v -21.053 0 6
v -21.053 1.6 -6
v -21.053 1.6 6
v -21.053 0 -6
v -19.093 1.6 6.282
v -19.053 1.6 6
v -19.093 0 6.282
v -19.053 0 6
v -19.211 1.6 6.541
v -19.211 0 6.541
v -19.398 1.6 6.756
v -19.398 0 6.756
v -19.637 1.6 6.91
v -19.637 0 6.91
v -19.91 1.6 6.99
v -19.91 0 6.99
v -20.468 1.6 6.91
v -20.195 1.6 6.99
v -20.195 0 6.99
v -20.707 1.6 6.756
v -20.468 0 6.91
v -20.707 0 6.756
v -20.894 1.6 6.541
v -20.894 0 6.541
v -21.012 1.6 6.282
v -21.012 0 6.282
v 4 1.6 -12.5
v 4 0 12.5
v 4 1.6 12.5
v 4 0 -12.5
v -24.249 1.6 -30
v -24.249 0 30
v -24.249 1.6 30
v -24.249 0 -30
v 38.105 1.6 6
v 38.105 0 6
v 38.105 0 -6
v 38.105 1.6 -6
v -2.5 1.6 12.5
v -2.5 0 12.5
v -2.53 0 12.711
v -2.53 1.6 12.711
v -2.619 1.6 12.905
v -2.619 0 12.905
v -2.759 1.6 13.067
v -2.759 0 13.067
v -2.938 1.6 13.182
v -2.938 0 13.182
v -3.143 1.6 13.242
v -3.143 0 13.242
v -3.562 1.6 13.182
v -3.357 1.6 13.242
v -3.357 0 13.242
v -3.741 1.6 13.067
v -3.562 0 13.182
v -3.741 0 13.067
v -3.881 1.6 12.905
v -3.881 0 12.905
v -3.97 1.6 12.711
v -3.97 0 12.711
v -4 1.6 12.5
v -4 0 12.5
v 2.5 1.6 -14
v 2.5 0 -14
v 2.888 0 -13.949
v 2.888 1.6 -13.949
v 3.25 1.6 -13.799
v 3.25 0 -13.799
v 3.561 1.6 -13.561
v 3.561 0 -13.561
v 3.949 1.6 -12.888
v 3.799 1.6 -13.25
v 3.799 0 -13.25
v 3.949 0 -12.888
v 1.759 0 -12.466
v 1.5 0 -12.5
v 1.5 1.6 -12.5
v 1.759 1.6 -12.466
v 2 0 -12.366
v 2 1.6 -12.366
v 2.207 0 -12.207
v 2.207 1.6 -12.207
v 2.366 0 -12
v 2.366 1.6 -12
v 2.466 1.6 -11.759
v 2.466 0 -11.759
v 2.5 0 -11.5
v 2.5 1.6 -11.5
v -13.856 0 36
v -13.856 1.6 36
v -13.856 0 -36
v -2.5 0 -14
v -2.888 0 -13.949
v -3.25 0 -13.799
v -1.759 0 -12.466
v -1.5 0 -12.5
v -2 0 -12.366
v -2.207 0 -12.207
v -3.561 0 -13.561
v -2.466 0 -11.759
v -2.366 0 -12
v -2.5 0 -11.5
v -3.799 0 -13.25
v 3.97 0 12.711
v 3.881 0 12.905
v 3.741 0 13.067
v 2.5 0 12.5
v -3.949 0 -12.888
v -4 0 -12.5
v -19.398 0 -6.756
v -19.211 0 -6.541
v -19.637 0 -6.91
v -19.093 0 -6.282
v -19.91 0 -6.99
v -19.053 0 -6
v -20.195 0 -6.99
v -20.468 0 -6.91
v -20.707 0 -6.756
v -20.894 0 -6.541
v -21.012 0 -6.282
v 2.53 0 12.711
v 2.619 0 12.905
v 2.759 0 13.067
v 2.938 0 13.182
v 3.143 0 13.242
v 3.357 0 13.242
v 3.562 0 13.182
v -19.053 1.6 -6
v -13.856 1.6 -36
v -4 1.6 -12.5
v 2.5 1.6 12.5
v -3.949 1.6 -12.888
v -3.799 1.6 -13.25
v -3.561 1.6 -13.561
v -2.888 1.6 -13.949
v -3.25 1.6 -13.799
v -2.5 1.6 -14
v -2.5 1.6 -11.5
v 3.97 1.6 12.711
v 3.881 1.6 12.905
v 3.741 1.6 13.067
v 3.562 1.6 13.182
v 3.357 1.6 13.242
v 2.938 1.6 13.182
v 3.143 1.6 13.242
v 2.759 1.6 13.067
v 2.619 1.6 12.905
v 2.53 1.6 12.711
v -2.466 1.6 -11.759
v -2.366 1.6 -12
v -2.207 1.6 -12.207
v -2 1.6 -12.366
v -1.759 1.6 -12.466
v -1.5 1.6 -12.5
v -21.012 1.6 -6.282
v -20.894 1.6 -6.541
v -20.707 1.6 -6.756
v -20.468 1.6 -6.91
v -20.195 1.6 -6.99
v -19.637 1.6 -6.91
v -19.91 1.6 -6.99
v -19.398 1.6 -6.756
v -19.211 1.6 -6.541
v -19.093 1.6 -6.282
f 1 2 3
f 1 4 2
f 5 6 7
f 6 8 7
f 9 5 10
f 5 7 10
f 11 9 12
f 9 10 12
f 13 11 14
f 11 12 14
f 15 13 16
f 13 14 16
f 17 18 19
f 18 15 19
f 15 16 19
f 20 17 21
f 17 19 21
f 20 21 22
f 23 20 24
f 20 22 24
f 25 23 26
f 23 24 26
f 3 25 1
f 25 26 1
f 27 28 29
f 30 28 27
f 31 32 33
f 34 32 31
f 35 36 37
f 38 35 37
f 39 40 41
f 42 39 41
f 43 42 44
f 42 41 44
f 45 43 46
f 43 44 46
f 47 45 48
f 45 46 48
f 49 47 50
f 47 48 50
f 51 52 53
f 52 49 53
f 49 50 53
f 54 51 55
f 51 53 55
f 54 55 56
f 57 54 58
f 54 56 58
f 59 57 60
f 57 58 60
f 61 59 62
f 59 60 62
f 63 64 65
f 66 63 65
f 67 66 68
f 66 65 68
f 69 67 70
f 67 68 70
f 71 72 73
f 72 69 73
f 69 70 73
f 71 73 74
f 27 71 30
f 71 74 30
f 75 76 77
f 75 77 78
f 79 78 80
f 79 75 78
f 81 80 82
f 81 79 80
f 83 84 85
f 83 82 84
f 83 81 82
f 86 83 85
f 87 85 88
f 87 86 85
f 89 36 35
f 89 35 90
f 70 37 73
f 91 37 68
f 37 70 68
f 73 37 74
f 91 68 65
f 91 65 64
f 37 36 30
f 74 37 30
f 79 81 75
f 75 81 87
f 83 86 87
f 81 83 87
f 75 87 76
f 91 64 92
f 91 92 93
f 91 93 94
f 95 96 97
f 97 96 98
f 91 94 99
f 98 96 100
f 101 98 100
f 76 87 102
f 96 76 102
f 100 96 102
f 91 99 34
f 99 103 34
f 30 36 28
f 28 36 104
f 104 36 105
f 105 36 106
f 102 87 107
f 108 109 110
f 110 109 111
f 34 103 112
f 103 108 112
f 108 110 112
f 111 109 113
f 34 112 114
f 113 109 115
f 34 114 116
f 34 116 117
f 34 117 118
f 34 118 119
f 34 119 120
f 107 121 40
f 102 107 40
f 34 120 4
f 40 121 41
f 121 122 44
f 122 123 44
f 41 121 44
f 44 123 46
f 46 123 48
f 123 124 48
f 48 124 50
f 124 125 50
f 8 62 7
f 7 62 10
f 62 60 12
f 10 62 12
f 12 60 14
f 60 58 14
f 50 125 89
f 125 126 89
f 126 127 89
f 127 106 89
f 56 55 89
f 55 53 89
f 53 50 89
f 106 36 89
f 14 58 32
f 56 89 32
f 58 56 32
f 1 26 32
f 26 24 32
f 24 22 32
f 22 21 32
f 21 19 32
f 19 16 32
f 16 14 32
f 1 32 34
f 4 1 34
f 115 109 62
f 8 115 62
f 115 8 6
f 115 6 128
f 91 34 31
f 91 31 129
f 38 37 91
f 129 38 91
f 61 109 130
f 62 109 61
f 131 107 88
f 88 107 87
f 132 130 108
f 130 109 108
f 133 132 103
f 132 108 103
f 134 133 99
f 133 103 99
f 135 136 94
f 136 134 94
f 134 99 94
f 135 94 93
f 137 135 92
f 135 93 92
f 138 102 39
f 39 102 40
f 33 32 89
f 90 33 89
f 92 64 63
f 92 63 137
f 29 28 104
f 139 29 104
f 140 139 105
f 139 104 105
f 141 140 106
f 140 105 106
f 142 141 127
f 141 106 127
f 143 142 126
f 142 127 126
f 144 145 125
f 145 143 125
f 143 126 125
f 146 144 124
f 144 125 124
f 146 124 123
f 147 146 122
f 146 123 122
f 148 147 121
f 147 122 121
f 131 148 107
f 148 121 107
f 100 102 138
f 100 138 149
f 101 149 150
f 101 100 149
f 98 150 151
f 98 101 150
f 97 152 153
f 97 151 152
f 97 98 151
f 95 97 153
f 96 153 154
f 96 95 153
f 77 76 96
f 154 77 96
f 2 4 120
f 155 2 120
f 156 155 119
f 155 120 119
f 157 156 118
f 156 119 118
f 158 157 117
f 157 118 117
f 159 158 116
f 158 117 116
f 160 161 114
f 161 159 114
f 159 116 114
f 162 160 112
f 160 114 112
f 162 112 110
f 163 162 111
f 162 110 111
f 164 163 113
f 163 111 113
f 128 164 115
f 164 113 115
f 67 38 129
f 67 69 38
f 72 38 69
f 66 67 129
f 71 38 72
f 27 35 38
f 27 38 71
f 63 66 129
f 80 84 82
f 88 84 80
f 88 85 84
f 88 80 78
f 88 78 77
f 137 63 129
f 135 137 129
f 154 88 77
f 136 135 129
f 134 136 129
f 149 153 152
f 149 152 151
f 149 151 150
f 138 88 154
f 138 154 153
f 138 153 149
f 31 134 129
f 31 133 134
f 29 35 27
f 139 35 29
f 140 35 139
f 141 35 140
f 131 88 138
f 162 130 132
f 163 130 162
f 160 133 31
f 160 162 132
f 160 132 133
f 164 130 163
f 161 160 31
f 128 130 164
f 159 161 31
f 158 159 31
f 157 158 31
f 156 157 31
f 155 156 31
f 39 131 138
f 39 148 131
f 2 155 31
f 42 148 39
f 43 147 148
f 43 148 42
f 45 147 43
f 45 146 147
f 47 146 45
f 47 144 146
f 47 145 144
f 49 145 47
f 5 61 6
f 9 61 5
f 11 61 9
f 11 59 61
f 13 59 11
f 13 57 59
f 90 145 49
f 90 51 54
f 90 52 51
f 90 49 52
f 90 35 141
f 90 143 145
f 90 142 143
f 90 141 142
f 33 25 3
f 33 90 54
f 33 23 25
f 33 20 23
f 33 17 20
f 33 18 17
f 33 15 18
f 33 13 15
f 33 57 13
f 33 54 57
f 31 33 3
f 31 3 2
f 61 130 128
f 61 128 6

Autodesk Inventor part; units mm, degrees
ref_plane "YZ Plane" through (0, 0, 0) normal (1, 0, 0) x (0, 1, 0)
ref_plane "XZ Plane" through (0, 0, 0) normal (0, 1, 0) x (-1, 0, 0)
ref_plane "XY Plane" through (0, 0, 0) normal (0, 0, 1) x (1, 0, 0)
sketch "Sketch1" plane through (0, 0, 0) normal (0, 1, 0) x (-1, 0, 0)
  line L0 (-38.1051, 6) -> (13.8564, 36)
  line L1 (-38.1051, -6) -> (13.8564, -36)
  line L2 (24.2487, 30) -> (24.2487, -30)
  line L3 (24.2487, 30) -> (13.8564, 36)
  line L4 (24.2487, -30) -> (13.8564, -36)
  line L5 (-38.1051, 6) -> (-38.1051, -6)
  line L6 (19.0526, 6) -> (19.0526, -6)
  line L7 (21.0526, -6) -> (21.0526, 6)
  arc A0 (21.0526, 6) -> (19.0526, 6) centre (20.0526, 6) ccw
  arc A1 (19.0526, -6) -> (21.0526, -6) centre (20.0526, -6) ccw
  line L8 (-2.5, 12.5) -> (-2.5, -11.5)
  line L9 (-1.5, -12.5) -> (1.5, -12.5)
  line L10 (2.5, -11.5) -> (2.5, 12.5)
  line L11 (-4, 12.5) -> (-4, -12.5)
  line L12 (-2.5, -14) -> (2.5, -14)
  line L13 (4, -12.5) -> (4, 12.5)
  arc A2 (4, 12.5) -> (2.5, 12.5) centre (3.25, 12.5) ccw
  arc A3 (-2.5, 12.5) -> (-4, 12.5) centre (-3.25, 12.5) ccw
  arc A4 (2.5, -14) -> (4, -12.5) centre (2.5, -12.5) ccw
  arc A5 (-4, -12.5) -> (-2.5, -14) centre (-2.5, -12.5) ccw
  arc A6 (-2.5, -11.5) -> (-1.5, -12.5) centre (-1.5, -11.5) ccw
  arc A7 (1.5, -12.5) -> (2.5, -11.5) centre (1.5, -11.5) ccw
  point P0 (0, 0)
  point P1 (0, 0)
extrude "Extrusion1" add sketch "Sketch1" along normal blind 1.6
properties part number "PCB_Bottom"
